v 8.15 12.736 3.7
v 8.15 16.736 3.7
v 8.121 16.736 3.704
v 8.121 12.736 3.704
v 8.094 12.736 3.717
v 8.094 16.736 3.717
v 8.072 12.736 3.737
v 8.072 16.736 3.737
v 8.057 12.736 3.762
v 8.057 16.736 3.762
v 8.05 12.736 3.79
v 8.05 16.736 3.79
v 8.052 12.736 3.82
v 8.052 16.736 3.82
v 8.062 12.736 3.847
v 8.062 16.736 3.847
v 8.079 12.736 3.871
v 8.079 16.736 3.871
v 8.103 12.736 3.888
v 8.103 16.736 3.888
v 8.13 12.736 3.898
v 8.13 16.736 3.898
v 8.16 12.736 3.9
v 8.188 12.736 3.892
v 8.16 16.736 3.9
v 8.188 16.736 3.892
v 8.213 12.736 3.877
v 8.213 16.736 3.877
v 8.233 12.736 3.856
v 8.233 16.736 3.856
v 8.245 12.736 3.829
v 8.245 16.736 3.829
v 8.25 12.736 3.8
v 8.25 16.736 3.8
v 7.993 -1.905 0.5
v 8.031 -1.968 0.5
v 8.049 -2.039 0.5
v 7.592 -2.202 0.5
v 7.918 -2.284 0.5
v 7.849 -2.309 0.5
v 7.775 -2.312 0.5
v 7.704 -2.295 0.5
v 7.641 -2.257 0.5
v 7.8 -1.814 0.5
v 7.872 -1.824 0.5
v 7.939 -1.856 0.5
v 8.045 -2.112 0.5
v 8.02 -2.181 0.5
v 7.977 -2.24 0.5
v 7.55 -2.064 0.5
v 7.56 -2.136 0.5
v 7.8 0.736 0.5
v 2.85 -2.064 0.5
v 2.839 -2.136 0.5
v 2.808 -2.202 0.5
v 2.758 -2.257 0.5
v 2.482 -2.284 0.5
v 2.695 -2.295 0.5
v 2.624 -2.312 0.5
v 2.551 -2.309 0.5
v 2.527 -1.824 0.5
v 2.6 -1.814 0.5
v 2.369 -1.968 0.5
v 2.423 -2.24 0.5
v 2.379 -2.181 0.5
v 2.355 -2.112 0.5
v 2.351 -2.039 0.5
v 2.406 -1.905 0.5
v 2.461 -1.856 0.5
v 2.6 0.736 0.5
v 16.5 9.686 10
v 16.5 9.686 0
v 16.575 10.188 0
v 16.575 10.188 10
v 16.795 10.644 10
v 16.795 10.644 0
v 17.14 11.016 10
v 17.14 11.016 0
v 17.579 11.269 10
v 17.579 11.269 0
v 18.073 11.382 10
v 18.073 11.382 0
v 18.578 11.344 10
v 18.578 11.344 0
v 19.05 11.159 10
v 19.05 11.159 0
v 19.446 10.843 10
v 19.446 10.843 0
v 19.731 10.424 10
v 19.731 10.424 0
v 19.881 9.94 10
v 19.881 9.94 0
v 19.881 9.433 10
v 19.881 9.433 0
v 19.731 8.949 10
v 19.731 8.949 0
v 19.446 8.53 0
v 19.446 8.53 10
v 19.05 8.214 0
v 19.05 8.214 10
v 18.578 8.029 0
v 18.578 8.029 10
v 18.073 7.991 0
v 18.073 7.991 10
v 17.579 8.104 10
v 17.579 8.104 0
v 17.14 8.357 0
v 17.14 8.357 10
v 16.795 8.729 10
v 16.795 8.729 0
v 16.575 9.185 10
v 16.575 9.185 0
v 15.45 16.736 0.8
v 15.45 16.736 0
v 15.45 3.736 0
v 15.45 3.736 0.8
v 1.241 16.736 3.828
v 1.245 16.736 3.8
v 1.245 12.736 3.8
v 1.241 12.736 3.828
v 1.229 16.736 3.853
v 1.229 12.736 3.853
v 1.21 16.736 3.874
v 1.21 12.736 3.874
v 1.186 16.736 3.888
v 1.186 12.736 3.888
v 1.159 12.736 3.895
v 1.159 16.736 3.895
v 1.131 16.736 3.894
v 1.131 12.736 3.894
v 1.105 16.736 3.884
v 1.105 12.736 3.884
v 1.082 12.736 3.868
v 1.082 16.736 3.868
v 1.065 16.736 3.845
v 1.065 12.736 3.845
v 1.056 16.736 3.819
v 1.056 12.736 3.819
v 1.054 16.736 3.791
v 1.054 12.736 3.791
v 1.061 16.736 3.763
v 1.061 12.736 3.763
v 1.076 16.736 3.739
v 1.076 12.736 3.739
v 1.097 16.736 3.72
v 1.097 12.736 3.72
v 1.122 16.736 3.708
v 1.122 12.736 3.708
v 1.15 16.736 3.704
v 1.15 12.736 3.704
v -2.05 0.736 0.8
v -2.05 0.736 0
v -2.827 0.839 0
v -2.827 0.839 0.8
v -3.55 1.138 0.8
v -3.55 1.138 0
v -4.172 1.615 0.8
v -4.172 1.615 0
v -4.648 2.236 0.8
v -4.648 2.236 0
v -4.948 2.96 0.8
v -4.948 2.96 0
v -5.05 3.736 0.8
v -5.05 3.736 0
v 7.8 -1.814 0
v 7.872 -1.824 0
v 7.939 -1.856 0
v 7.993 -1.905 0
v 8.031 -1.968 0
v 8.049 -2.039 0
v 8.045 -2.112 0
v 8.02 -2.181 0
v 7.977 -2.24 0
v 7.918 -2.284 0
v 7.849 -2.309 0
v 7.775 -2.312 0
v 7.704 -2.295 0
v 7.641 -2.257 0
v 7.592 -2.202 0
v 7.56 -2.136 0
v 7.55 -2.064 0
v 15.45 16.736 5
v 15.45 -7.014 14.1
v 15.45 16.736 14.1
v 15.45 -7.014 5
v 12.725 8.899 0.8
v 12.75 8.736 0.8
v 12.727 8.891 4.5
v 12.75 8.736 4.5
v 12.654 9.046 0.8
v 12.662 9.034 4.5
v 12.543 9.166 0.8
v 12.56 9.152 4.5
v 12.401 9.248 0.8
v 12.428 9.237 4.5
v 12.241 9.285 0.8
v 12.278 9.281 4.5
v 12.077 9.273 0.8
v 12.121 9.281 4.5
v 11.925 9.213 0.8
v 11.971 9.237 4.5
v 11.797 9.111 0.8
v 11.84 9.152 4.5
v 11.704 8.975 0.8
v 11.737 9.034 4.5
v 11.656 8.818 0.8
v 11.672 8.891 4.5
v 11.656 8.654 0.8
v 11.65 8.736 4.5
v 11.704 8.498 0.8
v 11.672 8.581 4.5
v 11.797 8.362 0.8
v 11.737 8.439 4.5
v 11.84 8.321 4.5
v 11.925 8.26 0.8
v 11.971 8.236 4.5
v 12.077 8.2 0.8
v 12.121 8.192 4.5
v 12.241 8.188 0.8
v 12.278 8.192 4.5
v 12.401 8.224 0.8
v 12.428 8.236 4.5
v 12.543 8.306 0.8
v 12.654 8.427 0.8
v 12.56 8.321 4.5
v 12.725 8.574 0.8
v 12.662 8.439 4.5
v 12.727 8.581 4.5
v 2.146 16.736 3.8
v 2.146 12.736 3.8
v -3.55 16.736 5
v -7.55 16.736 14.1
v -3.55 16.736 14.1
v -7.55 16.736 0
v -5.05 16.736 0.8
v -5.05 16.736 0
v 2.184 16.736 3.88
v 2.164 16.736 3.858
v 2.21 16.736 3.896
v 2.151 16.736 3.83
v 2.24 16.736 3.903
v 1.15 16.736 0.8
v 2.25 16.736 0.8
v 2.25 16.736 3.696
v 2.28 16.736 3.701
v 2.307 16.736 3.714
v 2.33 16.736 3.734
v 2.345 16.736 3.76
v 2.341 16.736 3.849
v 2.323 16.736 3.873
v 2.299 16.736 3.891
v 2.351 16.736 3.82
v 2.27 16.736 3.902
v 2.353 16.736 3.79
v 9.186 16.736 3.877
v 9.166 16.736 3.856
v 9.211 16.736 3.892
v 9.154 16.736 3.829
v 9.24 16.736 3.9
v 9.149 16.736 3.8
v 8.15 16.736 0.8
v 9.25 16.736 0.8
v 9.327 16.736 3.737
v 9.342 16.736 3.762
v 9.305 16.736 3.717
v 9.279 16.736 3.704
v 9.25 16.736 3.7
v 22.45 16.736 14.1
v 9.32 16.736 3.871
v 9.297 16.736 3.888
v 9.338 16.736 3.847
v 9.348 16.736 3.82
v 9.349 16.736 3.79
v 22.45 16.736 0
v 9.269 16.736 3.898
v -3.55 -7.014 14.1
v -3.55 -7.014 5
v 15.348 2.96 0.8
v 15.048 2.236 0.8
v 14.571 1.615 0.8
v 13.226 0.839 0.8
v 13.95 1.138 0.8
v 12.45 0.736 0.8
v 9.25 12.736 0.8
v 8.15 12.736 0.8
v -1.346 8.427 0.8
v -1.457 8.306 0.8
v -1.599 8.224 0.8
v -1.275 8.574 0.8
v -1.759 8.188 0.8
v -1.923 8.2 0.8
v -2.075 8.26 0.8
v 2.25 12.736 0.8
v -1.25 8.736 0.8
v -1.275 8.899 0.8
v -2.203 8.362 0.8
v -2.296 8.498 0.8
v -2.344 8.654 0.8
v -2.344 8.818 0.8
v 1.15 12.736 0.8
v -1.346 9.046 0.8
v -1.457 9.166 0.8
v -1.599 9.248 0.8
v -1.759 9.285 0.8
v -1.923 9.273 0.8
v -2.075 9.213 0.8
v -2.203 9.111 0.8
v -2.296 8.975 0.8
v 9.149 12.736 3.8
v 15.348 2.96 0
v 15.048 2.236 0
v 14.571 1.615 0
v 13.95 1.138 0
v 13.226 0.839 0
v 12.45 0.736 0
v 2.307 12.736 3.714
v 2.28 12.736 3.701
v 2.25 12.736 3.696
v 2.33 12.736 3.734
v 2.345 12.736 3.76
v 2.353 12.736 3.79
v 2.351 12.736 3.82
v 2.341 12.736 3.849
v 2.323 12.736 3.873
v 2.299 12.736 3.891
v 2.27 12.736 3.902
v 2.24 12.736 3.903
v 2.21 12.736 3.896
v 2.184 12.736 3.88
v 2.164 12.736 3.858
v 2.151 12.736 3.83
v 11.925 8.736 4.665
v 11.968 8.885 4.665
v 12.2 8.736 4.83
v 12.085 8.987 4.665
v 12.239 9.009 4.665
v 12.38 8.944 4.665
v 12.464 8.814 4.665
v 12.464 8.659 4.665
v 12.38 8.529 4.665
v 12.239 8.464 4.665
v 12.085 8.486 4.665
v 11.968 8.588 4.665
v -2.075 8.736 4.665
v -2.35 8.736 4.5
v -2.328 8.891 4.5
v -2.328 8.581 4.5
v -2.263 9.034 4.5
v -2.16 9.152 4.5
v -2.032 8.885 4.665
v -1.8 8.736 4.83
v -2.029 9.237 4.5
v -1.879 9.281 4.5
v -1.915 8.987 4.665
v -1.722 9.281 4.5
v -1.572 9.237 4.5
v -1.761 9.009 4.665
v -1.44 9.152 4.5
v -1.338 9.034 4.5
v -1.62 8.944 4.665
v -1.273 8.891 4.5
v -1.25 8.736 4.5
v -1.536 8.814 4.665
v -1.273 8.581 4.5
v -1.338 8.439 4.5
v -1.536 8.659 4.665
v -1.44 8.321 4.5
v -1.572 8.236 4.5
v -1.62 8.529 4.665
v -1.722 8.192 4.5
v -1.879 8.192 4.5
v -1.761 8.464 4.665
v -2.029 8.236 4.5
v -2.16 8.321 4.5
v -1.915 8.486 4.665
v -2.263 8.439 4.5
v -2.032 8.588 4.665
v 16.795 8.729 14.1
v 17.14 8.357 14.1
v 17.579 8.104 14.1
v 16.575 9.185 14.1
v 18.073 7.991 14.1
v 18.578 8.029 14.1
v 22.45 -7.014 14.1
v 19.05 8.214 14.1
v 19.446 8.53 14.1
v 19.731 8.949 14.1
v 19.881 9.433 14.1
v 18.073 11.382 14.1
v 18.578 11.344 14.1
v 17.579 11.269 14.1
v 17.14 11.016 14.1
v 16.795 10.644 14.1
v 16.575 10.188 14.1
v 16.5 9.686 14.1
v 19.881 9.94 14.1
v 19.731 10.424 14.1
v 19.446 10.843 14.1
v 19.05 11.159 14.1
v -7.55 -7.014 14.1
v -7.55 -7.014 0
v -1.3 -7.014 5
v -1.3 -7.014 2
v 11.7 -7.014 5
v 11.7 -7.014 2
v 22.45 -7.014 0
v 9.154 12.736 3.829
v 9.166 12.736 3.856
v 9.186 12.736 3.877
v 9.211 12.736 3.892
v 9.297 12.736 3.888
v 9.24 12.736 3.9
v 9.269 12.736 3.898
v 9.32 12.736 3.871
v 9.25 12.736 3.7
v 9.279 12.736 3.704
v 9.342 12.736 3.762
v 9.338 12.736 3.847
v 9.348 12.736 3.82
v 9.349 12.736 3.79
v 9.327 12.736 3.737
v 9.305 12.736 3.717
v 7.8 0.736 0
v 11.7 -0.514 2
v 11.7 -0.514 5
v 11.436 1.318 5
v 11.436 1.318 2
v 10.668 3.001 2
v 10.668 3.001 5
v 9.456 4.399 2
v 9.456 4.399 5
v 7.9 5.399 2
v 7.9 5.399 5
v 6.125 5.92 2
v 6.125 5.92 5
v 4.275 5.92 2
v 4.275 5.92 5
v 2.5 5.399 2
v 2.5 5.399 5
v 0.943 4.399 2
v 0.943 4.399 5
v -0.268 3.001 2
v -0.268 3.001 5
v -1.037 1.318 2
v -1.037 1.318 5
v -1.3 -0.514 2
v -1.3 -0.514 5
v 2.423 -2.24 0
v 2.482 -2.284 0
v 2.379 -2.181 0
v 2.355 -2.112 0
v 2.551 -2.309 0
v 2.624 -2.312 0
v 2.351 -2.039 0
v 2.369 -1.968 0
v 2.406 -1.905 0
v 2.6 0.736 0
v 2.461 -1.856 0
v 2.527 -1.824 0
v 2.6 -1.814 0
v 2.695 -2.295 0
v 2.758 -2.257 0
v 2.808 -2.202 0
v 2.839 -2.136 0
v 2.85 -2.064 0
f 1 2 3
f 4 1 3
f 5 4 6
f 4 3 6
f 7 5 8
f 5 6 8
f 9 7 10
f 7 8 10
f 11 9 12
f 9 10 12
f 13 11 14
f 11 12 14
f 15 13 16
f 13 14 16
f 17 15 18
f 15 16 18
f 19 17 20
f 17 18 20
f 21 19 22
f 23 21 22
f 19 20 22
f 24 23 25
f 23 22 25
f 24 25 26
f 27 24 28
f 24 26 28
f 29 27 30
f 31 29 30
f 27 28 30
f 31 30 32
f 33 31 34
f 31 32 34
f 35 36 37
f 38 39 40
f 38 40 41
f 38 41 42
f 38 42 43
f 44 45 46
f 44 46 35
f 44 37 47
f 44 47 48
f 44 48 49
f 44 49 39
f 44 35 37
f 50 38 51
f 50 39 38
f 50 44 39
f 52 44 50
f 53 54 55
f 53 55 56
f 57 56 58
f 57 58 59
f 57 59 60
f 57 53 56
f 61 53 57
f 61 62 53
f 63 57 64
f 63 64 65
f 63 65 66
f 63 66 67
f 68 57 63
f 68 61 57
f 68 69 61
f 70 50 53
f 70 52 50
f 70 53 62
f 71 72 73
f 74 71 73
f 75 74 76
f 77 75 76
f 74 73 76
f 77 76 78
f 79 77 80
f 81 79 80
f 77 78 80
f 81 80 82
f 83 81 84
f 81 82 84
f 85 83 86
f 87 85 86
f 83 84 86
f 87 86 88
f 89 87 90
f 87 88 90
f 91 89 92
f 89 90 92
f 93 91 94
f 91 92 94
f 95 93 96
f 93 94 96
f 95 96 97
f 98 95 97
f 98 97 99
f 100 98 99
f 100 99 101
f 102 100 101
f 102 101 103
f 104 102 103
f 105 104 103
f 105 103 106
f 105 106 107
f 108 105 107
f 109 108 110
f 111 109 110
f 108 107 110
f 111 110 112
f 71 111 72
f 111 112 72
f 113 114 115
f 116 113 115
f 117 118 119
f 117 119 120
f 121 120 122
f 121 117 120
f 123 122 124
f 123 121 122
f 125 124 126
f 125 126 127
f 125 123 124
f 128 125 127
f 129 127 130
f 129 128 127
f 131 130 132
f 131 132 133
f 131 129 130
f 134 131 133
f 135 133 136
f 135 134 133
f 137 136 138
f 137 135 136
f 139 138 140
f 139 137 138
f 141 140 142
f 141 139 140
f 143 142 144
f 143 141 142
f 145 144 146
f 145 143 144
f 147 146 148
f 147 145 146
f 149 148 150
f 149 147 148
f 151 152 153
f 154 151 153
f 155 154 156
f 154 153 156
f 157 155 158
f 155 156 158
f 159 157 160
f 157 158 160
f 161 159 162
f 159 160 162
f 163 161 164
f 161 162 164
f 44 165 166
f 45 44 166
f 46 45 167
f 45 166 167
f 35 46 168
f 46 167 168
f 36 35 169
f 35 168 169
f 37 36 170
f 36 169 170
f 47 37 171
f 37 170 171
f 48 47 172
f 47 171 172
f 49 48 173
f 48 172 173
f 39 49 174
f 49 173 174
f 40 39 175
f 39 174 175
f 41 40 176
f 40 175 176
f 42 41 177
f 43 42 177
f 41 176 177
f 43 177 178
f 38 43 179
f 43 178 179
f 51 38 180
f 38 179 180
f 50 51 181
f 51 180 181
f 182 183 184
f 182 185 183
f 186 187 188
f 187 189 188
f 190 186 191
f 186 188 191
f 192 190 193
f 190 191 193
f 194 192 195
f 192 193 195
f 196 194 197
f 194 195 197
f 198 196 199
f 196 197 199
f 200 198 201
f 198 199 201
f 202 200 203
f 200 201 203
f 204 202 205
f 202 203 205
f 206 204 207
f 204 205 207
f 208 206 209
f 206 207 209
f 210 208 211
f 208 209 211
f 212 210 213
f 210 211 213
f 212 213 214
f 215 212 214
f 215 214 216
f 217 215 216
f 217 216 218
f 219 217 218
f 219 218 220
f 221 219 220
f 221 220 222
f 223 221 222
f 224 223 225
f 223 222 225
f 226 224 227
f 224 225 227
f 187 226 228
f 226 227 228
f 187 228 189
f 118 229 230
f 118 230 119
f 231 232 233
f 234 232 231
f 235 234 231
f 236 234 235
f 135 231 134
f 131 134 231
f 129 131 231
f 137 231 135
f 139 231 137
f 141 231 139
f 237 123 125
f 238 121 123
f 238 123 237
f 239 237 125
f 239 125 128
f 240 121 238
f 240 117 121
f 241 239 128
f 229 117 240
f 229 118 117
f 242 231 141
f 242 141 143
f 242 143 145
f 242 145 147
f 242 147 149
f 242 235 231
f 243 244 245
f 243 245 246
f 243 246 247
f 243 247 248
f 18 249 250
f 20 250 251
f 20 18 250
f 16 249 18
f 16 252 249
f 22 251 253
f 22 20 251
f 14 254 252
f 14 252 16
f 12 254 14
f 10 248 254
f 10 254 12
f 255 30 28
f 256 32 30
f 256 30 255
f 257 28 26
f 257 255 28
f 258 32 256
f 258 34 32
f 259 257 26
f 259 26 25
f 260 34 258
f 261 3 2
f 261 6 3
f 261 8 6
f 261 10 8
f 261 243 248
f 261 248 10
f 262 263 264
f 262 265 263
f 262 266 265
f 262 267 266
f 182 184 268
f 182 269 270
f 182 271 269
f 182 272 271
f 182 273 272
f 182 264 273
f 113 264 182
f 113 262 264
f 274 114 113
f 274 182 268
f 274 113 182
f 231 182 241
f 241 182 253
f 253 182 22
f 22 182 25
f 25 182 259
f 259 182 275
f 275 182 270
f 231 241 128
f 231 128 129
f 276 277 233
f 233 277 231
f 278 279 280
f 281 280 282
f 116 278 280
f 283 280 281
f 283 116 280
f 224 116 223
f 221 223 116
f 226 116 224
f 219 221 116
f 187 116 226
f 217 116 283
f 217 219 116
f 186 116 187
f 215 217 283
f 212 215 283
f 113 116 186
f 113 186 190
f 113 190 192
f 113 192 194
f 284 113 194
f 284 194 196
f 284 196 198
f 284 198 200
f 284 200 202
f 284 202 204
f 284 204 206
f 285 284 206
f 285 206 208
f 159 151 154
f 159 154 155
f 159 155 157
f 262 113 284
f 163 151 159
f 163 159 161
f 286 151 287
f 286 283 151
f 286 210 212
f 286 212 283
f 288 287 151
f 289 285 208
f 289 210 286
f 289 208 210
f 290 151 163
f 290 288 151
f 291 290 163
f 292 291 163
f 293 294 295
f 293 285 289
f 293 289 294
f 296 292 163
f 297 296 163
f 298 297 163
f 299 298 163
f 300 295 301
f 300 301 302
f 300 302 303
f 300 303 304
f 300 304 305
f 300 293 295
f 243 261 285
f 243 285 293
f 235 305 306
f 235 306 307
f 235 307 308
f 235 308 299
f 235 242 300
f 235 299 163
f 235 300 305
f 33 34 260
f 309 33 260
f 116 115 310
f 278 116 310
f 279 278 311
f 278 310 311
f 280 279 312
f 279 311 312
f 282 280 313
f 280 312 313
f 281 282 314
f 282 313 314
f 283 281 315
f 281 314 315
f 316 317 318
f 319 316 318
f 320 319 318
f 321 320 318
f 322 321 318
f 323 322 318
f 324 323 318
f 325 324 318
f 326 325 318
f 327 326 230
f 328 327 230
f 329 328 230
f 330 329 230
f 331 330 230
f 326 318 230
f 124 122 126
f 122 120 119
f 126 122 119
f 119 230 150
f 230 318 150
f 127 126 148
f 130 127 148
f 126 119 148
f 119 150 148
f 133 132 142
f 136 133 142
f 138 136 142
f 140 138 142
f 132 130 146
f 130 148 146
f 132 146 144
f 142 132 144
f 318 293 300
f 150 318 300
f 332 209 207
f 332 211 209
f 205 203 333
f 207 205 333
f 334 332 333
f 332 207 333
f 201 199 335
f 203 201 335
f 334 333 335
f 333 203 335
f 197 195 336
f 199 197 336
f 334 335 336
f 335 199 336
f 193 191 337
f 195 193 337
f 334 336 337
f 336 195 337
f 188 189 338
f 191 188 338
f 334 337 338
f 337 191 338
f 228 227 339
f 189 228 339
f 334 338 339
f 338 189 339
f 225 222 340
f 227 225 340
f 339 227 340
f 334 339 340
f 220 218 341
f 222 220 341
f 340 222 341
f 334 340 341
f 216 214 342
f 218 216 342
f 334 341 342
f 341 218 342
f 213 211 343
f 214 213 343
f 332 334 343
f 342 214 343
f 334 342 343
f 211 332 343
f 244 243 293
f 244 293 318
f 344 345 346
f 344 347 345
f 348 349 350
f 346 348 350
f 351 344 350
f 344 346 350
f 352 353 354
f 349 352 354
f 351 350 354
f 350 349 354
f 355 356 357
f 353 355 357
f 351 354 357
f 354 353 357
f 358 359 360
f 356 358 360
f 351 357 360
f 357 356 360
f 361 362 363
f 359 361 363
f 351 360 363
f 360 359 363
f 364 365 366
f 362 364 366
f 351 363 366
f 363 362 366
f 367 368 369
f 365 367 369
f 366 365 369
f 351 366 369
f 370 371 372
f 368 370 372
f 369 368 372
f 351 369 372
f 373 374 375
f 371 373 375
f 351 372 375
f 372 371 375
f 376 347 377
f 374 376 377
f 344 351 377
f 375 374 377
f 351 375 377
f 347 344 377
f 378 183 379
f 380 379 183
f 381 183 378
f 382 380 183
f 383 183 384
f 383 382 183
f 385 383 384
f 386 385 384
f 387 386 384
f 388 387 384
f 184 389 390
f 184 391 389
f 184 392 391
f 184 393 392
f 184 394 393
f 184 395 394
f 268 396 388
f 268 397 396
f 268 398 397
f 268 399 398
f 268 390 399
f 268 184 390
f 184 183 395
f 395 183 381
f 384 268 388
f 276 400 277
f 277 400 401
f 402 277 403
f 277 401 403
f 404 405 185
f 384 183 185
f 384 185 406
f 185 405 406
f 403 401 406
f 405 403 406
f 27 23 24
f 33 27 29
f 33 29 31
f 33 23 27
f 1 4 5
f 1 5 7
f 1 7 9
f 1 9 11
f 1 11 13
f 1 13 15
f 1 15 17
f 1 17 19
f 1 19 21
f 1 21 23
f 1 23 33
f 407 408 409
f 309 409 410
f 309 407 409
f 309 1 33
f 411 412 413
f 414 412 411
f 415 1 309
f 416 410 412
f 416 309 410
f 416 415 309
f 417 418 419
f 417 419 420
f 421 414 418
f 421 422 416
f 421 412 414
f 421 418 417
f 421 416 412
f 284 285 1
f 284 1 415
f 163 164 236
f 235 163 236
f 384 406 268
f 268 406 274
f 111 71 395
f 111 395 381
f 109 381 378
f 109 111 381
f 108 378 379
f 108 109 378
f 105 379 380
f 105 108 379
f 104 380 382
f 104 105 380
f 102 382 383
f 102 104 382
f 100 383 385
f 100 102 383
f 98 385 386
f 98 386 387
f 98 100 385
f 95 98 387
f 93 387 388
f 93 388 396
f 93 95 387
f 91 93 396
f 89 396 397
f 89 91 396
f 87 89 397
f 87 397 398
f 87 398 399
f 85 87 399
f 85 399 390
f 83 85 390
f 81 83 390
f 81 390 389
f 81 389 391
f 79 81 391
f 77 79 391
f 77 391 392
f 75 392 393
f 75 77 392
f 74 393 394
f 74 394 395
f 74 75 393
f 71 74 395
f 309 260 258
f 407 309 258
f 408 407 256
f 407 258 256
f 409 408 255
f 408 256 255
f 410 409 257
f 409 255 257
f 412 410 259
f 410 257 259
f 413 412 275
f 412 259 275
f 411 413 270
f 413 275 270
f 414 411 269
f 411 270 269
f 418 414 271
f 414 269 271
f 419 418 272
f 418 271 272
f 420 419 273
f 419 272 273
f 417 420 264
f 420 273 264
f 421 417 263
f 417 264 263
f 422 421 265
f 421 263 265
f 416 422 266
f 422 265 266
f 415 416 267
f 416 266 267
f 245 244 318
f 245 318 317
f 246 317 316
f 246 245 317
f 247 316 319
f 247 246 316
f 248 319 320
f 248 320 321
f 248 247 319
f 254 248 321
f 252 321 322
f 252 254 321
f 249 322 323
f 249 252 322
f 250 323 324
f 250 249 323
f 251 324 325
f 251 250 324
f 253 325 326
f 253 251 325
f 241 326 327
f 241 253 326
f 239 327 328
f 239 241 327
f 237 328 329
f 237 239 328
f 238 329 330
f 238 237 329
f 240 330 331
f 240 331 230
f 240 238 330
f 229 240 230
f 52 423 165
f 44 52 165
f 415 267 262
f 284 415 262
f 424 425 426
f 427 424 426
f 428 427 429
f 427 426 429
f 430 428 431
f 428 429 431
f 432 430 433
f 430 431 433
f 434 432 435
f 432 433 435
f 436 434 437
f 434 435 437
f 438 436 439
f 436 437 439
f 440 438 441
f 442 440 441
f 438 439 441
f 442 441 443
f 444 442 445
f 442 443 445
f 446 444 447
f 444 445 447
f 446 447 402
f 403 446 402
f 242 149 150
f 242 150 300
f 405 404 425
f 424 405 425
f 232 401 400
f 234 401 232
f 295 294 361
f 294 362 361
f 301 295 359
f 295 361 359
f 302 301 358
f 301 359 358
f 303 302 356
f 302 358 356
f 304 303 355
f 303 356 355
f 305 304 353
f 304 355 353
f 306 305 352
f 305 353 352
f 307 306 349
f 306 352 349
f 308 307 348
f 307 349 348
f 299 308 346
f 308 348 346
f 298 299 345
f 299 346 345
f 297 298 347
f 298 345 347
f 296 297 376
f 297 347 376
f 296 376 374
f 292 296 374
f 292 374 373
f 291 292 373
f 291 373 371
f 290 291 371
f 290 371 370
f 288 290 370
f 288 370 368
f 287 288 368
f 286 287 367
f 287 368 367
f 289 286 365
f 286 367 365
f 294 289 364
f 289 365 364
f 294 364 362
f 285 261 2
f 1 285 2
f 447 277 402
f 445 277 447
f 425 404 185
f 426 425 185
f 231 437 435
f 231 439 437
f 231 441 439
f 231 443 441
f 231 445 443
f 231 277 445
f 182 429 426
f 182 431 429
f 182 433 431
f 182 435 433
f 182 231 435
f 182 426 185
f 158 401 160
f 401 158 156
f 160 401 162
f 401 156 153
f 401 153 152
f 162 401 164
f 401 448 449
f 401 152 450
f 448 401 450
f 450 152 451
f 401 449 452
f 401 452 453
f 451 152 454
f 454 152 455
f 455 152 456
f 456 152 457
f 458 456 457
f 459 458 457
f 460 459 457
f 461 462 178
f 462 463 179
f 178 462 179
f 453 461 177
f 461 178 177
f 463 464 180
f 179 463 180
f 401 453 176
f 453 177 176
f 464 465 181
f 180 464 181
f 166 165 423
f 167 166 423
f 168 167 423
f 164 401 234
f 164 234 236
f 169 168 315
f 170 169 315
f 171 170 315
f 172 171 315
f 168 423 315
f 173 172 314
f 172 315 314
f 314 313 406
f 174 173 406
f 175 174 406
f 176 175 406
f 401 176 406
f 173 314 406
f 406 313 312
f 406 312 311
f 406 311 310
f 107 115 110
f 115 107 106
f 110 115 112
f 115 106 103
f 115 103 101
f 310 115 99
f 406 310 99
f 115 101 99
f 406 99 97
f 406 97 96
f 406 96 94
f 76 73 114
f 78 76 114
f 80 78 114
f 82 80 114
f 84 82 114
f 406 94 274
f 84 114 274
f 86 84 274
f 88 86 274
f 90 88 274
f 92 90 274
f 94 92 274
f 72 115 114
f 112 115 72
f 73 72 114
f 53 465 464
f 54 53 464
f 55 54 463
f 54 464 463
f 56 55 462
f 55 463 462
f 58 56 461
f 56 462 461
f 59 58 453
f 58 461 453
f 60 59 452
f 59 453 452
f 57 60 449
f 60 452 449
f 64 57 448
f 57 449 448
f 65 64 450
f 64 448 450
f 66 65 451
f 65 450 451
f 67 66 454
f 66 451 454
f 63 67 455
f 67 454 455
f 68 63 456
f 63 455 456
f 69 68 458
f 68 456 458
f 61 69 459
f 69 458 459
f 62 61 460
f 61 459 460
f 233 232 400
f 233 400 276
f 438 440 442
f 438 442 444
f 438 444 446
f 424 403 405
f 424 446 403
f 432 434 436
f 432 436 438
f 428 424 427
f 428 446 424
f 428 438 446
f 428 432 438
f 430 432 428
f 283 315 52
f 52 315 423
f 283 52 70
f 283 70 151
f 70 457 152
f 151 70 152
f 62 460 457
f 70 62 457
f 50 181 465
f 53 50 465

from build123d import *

# Parameters (mm, degrees)
SKETCH_1_W          = 30
SKETCH_1_H          = 28
EXTRUDE_1_DEPTH     = 10
CUT_EXTRUDE_2_DEPTH = 0.8
M1_4X0_3_2_D        = 1.1
M1_4X0_3_2_DEPTH    = 3.7
M1_4X0_3_2_TIP      = 0.33047334
CUT_EXTRUDE_3_DEPTH = 4
CUT_EXTRUDE_4_DEPTH = 0.5
SKETCH_12_W         = 30
SKETCH_12_H         = 4.25
CUT_EXTRUDE_5_DEPTH = 10
SKETCH_13_R         = 1.7
CUT_EXTRUDE_6_DEPTH = 10
SKETCH_14_W         = 23
SKETCH_14_H         = 23.75
CUT_EXTRUDE_7_DEPTH = 5
CUT_EXTRUDE_9_DEPTH = 3
SKETCH_20_W         = 7
SKETCH_20_H         = 23.75
SKETCH_20_R         = 1.7
EXTRUDE_3_DEPTH     = 4.1
SKETCH_23_W         = 4
SKETCH_23_H         = 23.75
EXTRUDE_4_DEPTH     = 9.1


with BuildPart() as part:
    # 草图1 → 凸台-拉伸1 (new body)
    with BuildSketch(Plane.XY):
        with Locations((7.449728974, 2.736434109)):
            Rectangle(SKETCH_1_W, SKETCH_1_H)
    extrude(amount=EXTRUDE_1_DEPTH)

    # 草图2 → 切除-拉伸2 (cut)
    with BuildSketch(Plane(origin=(0, 0, 0), x_dir=(-1, 0, 0), z_dir=(0, 0, -1))):
        with BuildLine():
            Line((5.050271026, 16.736434109), (-15.449728974, 16.736434109))
            Line((-15.449728974, 16.736434109), (-15.449728974, 3.736434109))
            ThreePointArc((-15.449728974, 3.736434109), (-14.571049317, 1.615113765), (-12.449728974, 0.736434109))
            Line((-12.449728974, 0.736434109), (2.050271026, 0.736434109))
            ThreePointArc((2.050271026, 0.736434109), (4.17159137, 1.615113765), (5.050271026, 3.736434109))
            Line((5.050271026, 3.736434109), (5.050271026, 16.736434109))
        make_face()
    extrude(amount=-CUT_EXTRUDE_2_DEPTH, mode=Mode.SUBTRACT)

    # M1.4x0.3 螺纹孔2
    with Locations(Plane(origin=(0, 0, 0.8), x_dir=(-1, 0, 0), z_dir=(0, 0, -1))):
        with Locations((-12.199728974, 8.736434109), (1.800271026, 8.736434109)):
            Hole(M1_4X0_3_2_D / 2, depth=M1_4X0_3_2_DEPTH)
            with Locations((0, 0, -(M1_4X0_3_2_DEPTH + M1_4X0_3_2_TIP / 2))):  # 118° drill point
                Cone(0, M1_4X0_3_2_D / 2, M1_4X0_3_2_TIP, mode=Mode.SUBTRACT)

    # 草图10 → 切除-拉伸3 (cut)
    with BuildSketch(Plane(origin=(0, 16.736434109, 0), x_dir=(1, 0, 0), z_dir=(0, 1, 0))):
        with BuildLine():
            Line((9.249728974, -0.8), (8.149728974, -0.8))
            Line((8.149728974, -0.8), (8.149728974, -3.7))
            ThreePointArc((8.149728974, -3.7), (8.07901805, -3.870710433), (8.249728974, -3.800000693))
            Line((8.249728974, -3.800000693), (9.14947862, -3.800000693))
            ThreePointArc((9.14947862, -3.800000693), (9.320100726, -3.870799843), (9.249728974, -3.700001016))
            Line((9.249728974, -3.700001016), (9.249728974, -0.8))
        make_face()
        with BuildLine():
            Line((1.149728974, -0.8), (2.249728974, -0.8))
            Line((2.249728974, -0.8), (2.249728974, -3.696415438))
            ThreePointArc((2.249728974, -3.696415438), (2.32297432, -3.873245346), (2.146144411, -3.8))
            Line((2.146144411, -3.8), (1.245429293, -3.8))
            ThreePointArc((1.245429293, -3.8), (1.082058629, -3.867670345), (1.149728974, -3.704299681))
            Line((1.149728974, -3.704299681), (1.149728974, -0.8))
        make_face()
    extrude(amount=-CUT_EXTRUDE_3_DEPTH, mode=Mode.SUBTRACT)

    # 草图11 → 切除-拉伸4 (cut)
    with BuildSketch(Plane(origin=(0, 0, 0), x_dir=(-1, 0, 0), z_dir=(0, 0, -1))):
        with BuildLine():
            Line((-7.549728974, -2.063565891), (-2.849728974, -2.063565891))
            ThreePointArc((-2.849728974, -2.063565891), (-2.422952278, -2.240342587), (-2.599728974, -1.813565891))
            Line((-2.599728974, -1.813565891), (-2.599728974, 0.736434109))
            Line((-2.599728974, 0.736434109), (-7.799728974, 0.736434109))
            Line((-7.799728974, 0.736434109), (-7.799728974, -1.813565891))
            ThreePointArc((-7.799728974, -1.813565891), (-7.976505669, -2.240342587), (-7.549728974, -2.063565891))
        make_face()
    extrude(amount=-CUT_EXTRUDE_4_DEPTH, mode=Mode.SUBTRACT)

    # 草图12 → 切除-拉伸5 (cut)
    with BuildSketch(Plane(origin=(0, 0, 0), x_dir=(-1, 0, 0), z_dir=(0, 0, -1))):
        with Locations((-7.449728974, -9.138565891)):
            Rectangle(SKETCH_12_W, SKETCH_12_H)
    extrude(amount=-CUT_EXTRUDE_5_DEPTH, mode=Mode.SUBTRACT)

    # 草图13 → 切除-拉伸6 (cut)
    with BuildSketch(Plane(origin=(0, 0, 0), x_dir=(-1, 0, 0), z_dir=(0, 0, -1))):
        with Locations((-18.199728974, 9.686434109)):
            Circle(SKETCH_13_R)
    extrude(amount=-CUT_EXTRUDE_6_DEPTH, mode=Mode.SUBTRACT)

    # 草图14 → 切除-拉伸7 (cut)
    with BuildSketch(Plane.XY.offset(10)):
        with Locations((3.949728974, 4.861434109)):
            Rectangle(SKETCH_14_W, SKETCH_14_H)
    extrude(amount=-CUT_EXTRUDE_7_DEPTH, mode=Mode.SUBTRACT)

    # 草图16 → 切除-拉伸9 (cut)
    with BuildSketch(Plane.XY.offset(5)):
        with BuildLine():
            Line((-1.300271026, -7.013565891), (11.699728974, -7.013565891))
            Line((11.699728974, -7.013565891), (11.699728974, -0.513565891))
            ThreePointArc((11.699728974, -0.513565891), (5.199728974, 5.986434109), (-1.300271026, -0.513565891))
            Line((-1.300271026, -0.513565891), (-1.300271026, -7.013565891))
        make_face()
    extrude(amount=-CUT_EXTRUDE_9_DEPTH, mode=Mode.SUBTRACT)

    # 草图20 → 凸台-拉伸3 (add)
    with BuildSketch(Plane.XY.offset(10)):
        with Locations((18.949728974, 4.861434109)):
            Rectangle(SKETCH_20_W, SKETCH_20_H)
        with Locations(Location((18.199728974, 9.686434109, 0), (0, 0, 180))):
            Circle(SKETCH_20_R, mode=Mode.SUBTRACT)
    extrude(amount=EXTRUDE_3_DEPTH)

    # 草图23 → 凸台-拉伸4 (add)
    with BuildSketch(Plane.XY.offset(5)):
        with Locations((-5.550271026, 4.861434109)):
            Rectangle(SKETCH_23_W, SKETCH_23_H)
    extrude(amount=EXTRUDE_4_DEPTH)


solid = part.part
